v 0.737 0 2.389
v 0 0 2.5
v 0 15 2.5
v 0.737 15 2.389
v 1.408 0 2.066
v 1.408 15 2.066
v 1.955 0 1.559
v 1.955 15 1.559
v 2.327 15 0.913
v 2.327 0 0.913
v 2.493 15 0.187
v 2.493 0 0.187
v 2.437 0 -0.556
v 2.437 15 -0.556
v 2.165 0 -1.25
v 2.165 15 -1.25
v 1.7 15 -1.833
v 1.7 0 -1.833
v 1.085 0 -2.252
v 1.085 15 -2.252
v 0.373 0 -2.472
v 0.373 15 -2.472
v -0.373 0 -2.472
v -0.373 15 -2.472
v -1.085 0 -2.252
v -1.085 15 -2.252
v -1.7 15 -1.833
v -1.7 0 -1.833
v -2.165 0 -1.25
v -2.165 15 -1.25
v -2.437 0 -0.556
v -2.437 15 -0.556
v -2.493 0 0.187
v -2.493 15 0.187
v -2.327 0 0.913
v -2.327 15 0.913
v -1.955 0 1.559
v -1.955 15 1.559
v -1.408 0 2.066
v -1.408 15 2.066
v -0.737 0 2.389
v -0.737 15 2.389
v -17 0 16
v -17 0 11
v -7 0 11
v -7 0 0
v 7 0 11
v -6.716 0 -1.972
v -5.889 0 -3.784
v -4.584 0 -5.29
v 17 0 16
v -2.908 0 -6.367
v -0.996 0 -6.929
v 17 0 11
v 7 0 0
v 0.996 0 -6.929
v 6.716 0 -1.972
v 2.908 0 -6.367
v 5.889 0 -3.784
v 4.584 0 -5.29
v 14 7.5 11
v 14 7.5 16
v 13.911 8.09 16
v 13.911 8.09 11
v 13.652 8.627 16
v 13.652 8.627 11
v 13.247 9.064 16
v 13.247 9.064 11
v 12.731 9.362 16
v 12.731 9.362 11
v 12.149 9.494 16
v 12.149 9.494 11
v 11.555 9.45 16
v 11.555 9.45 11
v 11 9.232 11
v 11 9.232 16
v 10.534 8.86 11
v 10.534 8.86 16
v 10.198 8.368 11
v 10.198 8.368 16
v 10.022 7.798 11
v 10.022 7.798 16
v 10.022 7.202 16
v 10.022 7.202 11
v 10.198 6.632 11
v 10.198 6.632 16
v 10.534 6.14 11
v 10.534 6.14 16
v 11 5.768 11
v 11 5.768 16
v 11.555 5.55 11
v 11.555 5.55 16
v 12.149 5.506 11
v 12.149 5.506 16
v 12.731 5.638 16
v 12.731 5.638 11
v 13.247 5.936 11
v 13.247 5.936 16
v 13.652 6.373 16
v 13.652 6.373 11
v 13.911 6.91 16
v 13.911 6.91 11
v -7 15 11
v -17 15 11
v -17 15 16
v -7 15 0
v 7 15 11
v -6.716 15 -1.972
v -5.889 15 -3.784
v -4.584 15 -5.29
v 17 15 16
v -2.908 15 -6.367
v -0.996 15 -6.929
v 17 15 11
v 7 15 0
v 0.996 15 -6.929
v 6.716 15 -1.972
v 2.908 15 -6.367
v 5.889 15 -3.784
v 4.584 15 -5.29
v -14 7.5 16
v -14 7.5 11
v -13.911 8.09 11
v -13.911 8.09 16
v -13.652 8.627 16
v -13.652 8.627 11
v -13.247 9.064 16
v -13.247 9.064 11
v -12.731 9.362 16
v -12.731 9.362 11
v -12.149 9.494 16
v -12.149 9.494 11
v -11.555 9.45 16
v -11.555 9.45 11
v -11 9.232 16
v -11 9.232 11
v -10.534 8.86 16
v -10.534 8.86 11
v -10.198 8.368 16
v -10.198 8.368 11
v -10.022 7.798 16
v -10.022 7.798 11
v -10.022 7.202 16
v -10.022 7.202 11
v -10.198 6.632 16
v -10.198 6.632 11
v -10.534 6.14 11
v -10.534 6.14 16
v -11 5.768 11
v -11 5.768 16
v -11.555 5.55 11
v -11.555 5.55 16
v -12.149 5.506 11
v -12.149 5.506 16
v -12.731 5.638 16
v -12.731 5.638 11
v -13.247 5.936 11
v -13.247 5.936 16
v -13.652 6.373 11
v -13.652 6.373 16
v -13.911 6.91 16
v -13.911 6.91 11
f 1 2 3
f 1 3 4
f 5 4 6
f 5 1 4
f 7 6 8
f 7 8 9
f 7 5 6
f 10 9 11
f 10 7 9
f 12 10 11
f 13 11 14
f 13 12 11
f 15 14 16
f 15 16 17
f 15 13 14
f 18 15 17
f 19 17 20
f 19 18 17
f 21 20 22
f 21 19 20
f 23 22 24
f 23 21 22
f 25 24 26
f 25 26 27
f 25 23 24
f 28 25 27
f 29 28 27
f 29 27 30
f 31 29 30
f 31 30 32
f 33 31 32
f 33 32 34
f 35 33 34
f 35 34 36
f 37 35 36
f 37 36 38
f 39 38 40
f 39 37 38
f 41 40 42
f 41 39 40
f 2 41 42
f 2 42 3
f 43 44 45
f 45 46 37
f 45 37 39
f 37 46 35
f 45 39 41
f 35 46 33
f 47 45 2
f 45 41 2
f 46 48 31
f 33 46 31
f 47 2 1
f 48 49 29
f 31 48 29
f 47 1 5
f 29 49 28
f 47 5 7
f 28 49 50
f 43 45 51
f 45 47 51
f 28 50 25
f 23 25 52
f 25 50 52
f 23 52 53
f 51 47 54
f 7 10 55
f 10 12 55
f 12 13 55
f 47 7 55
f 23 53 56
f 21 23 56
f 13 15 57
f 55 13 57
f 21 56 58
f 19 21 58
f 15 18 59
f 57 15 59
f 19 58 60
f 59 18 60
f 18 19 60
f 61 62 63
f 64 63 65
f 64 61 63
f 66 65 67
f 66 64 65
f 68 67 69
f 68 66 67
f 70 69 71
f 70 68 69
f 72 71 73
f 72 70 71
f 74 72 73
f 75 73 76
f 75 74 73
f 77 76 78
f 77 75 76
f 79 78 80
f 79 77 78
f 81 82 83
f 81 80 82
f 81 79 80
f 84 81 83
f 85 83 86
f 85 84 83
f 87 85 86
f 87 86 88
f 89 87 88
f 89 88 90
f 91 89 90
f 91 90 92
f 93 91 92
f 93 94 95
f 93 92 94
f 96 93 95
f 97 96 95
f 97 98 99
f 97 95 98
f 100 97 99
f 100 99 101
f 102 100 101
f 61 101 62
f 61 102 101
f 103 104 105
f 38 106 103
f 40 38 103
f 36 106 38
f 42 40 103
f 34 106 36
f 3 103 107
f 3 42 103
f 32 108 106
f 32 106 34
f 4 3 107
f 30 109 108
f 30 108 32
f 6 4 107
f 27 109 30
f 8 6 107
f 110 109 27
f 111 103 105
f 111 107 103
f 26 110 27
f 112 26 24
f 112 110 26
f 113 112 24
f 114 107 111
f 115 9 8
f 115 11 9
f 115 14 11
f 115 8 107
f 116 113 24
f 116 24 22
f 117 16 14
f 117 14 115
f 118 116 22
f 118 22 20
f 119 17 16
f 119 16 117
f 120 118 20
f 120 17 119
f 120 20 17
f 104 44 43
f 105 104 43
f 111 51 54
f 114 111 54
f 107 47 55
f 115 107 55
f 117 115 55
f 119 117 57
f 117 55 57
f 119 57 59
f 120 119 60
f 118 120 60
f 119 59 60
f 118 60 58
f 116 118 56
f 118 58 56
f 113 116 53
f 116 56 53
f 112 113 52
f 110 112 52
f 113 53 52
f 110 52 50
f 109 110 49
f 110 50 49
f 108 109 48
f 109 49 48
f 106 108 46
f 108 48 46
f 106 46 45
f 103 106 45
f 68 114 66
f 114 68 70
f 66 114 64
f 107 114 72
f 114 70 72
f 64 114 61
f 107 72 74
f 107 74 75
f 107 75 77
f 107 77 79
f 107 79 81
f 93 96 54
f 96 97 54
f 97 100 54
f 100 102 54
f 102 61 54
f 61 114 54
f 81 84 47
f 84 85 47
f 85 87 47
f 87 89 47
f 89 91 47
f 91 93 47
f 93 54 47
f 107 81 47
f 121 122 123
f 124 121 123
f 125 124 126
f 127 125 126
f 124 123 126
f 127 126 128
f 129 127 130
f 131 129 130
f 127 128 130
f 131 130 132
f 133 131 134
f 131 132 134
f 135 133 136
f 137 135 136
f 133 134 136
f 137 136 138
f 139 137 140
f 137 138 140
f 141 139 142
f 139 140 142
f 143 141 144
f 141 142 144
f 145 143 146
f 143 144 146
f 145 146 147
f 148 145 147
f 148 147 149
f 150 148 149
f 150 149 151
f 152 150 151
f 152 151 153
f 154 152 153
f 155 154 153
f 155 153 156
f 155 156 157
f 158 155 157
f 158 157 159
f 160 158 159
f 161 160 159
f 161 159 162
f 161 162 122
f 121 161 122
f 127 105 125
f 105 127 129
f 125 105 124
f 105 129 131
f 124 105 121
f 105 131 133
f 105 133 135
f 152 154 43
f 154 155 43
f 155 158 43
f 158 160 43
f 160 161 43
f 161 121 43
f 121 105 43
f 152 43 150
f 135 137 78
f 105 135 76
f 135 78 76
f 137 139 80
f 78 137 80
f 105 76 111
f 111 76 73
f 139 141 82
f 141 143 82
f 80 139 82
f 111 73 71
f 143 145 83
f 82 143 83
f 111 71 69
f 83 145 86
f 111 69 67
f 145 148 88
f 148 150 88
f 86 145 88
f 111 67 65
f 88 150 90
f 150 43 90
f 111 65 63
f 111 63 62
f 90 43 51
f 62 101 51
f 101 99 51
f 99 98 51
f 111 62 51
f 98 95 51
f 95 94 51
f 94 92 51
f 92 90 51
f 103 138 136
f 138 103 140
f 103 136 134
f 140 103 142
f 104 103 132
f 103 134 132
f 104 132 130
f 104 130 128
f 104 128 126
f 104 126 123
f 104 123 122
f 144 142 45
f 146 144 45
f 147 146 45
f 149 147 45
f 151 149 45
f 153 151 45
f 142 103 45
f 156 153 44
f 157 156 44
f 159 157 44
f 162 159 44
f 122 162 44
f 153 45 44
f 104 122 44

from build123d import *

# Parameters (mm, degrees)
ESQUISSE1_R             = 2.5
BOSS_EXTRU_1_DEPTH      = 15
ESQUISSE2_R             = 2
ENL_V_MAT_EXTRU_1_DEPTH = 15


with BuildPart() as part:
    # Esquisse1 → Boss.-Extru.1 (new body)
    with BuildSketch(Plane(origin=(0, 0, 0), x_dir=(1, 0, 0), z_dir=(0, 1, 0))):
        with BuildLine():
            Line((-7, 0), (-7, -11))
            Line((-7, -11), (-17, -11))
            Line((-17, -11), (-17, -16))
            Line((-17, -16), (17, -16))
            Line((17, -16), (17, -11))
            Line((17, -11), (7, -11))
            Line((7, -11), (7, 0))
            ThreePointArc((7, 0), (0, 7), (-7, 0))
        make_face()
        with Locations(Location((0, 0, 0), (0, 0, 270))):
            Circle(ESQUISSE1_R, mode=Mode.SUBTRACT)
    extrude(amount=BOSS_EXTRU_1_DEPTH)

    # Esquisse2 → Enlèv. mat.-Extru.1 (cut)
    with BuildSketch(Plane(origin=(0, 0, 11), x_dir=(-1, 0, 0), z_dir=(0, 0, -1))):
        with Locations((12, 7.5)):
            Circle(ESQUISSE2_R)
    enl_v_mat_extru_1 = extrude(amount=-ENL_V_MAT_EXTRU_1_DEPTH, mode=Mode.SUBTRACT)

    # Symétrie1: Enlèv. mat.-Extru.1 across plane
    add(enl_v_mat_extru_1.mirror(Plane(origin=(0, 0, 0), x_dir=(0, 0, 1), z_dir=(1, 0, 0))), mode=Mode.SUBTRACT)


solid = part.part
